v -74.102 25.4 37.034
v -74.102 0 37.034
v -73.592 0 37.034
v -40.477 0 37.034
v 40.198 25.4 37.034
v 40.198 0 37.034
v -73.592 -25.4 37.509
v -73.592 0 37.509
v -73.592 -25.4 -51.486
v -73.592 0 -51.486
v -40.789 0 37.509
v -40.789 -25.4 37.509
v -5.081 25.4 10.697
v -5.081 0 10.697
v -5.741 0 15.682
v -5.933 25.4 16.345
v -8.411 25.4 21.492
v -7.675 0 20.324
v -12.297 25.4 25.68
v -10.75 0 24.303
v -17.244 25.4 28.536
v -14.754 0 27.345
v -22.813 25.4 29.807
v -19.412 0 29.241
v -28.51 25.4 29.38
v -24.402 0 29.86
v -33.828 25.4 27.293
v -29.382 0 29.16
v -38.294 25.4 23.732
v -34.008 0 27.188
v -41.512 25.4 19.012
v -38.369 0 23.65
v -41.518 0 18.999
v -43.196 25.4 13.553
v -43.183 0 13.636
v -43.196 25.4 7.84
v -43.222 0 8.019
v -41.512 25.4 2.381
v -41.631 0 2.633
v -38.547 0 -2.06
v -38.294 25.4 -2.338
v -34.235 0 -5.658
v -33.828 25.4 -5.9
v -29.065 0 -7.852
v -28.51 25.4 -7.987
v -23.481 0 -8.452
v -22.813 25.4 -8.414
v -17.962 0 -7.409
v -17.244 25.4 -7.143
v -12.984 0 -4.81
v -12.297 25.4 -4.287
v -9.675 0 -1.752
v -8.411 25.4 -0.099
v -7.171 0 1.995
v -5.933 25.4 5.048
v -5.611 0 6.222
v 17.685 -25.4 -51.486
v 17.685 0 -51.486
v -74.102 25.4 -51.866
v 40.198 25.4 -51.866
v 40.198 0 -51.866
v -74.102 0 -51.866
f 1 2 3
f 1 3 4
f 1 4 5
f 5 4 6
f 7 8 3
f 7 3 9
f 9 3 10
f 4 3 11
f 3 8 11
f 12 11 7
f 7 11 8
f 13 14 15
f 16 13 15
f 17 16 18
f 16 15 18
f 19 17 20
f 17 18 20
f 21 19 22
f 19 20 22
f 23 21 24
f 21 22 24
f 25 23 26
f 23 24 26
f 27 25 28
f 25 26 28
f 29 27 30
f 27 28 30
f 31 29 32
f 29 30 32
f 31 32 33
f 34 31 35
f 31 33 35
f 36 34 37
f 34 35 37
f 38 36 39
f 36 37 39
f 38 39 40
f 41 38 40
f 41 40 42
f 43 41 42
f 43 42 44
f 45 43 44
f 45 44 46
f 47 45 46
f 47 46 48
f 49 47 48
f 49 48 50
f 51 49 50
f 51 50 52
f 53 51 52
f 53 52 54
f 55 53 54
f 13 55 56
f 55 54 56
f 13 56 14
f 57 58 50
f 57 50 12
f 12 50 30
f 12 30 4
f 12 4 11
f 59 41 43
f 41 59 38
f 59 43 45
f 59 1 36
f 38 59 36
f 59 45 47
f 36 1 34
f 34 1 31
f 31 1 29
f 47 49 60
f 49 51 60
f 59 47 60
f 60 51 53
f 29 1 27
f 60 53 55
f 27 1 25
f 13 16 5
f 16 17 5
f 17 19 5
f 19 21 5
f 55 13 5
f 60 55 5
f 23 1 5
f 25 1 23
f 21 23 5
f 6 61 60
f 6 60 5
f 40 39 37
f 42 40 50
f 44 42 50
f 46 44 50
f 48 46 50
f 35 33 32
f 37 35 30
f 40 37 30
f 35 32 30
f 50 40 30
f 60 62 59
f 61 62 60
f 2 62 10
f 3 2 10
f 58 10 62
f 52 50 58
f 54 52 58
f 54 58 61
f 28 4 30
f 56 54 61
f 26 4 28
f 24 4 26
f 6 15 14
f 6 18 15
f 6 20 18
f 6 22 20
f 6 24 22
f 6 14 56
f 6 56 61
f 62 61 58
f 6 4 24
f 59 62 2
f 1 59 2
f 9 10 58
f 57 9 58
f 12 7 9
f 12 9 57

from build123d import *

# Parameters (mm, degrees)
F0_W     = 114.3
F0_H     = 88.9
F1_DEPTH = 25.4
F3_DEPTH = 25.4
F4_R     = 19.164267
F5_DEPTH = 50.8


with BuildPart() as f1:
    # F0 (on Front) → F1 (new body)
    with BuildSketch(Plane.XZ):
        with Locations((-16.952309, -7.416258)):
            Rectangle(F0_W, F0_H)
    extrude(amount=-F1_DEPTH)

    # F2 (on Front) → F3 (join)
    with BuildSketch(Plane.XZ):
        Polygon((17.68492, -51.485937), (-40.78941, 37.509143), (-73.592082, 37.509143), (-73.592082, -51.485937), align=None)
    extrude(amount=F3_DEPTH)

    # F4 (on Front) → F5 (cut)
    with BuildSketch(Plane.XZ):
        with Locations((-24.245456, 10.696524)):
            Circle(F4_R)
    extrude(amount=-F5_DEPTH, mode=Mode.SUBTRACT)


solid = f1.part
